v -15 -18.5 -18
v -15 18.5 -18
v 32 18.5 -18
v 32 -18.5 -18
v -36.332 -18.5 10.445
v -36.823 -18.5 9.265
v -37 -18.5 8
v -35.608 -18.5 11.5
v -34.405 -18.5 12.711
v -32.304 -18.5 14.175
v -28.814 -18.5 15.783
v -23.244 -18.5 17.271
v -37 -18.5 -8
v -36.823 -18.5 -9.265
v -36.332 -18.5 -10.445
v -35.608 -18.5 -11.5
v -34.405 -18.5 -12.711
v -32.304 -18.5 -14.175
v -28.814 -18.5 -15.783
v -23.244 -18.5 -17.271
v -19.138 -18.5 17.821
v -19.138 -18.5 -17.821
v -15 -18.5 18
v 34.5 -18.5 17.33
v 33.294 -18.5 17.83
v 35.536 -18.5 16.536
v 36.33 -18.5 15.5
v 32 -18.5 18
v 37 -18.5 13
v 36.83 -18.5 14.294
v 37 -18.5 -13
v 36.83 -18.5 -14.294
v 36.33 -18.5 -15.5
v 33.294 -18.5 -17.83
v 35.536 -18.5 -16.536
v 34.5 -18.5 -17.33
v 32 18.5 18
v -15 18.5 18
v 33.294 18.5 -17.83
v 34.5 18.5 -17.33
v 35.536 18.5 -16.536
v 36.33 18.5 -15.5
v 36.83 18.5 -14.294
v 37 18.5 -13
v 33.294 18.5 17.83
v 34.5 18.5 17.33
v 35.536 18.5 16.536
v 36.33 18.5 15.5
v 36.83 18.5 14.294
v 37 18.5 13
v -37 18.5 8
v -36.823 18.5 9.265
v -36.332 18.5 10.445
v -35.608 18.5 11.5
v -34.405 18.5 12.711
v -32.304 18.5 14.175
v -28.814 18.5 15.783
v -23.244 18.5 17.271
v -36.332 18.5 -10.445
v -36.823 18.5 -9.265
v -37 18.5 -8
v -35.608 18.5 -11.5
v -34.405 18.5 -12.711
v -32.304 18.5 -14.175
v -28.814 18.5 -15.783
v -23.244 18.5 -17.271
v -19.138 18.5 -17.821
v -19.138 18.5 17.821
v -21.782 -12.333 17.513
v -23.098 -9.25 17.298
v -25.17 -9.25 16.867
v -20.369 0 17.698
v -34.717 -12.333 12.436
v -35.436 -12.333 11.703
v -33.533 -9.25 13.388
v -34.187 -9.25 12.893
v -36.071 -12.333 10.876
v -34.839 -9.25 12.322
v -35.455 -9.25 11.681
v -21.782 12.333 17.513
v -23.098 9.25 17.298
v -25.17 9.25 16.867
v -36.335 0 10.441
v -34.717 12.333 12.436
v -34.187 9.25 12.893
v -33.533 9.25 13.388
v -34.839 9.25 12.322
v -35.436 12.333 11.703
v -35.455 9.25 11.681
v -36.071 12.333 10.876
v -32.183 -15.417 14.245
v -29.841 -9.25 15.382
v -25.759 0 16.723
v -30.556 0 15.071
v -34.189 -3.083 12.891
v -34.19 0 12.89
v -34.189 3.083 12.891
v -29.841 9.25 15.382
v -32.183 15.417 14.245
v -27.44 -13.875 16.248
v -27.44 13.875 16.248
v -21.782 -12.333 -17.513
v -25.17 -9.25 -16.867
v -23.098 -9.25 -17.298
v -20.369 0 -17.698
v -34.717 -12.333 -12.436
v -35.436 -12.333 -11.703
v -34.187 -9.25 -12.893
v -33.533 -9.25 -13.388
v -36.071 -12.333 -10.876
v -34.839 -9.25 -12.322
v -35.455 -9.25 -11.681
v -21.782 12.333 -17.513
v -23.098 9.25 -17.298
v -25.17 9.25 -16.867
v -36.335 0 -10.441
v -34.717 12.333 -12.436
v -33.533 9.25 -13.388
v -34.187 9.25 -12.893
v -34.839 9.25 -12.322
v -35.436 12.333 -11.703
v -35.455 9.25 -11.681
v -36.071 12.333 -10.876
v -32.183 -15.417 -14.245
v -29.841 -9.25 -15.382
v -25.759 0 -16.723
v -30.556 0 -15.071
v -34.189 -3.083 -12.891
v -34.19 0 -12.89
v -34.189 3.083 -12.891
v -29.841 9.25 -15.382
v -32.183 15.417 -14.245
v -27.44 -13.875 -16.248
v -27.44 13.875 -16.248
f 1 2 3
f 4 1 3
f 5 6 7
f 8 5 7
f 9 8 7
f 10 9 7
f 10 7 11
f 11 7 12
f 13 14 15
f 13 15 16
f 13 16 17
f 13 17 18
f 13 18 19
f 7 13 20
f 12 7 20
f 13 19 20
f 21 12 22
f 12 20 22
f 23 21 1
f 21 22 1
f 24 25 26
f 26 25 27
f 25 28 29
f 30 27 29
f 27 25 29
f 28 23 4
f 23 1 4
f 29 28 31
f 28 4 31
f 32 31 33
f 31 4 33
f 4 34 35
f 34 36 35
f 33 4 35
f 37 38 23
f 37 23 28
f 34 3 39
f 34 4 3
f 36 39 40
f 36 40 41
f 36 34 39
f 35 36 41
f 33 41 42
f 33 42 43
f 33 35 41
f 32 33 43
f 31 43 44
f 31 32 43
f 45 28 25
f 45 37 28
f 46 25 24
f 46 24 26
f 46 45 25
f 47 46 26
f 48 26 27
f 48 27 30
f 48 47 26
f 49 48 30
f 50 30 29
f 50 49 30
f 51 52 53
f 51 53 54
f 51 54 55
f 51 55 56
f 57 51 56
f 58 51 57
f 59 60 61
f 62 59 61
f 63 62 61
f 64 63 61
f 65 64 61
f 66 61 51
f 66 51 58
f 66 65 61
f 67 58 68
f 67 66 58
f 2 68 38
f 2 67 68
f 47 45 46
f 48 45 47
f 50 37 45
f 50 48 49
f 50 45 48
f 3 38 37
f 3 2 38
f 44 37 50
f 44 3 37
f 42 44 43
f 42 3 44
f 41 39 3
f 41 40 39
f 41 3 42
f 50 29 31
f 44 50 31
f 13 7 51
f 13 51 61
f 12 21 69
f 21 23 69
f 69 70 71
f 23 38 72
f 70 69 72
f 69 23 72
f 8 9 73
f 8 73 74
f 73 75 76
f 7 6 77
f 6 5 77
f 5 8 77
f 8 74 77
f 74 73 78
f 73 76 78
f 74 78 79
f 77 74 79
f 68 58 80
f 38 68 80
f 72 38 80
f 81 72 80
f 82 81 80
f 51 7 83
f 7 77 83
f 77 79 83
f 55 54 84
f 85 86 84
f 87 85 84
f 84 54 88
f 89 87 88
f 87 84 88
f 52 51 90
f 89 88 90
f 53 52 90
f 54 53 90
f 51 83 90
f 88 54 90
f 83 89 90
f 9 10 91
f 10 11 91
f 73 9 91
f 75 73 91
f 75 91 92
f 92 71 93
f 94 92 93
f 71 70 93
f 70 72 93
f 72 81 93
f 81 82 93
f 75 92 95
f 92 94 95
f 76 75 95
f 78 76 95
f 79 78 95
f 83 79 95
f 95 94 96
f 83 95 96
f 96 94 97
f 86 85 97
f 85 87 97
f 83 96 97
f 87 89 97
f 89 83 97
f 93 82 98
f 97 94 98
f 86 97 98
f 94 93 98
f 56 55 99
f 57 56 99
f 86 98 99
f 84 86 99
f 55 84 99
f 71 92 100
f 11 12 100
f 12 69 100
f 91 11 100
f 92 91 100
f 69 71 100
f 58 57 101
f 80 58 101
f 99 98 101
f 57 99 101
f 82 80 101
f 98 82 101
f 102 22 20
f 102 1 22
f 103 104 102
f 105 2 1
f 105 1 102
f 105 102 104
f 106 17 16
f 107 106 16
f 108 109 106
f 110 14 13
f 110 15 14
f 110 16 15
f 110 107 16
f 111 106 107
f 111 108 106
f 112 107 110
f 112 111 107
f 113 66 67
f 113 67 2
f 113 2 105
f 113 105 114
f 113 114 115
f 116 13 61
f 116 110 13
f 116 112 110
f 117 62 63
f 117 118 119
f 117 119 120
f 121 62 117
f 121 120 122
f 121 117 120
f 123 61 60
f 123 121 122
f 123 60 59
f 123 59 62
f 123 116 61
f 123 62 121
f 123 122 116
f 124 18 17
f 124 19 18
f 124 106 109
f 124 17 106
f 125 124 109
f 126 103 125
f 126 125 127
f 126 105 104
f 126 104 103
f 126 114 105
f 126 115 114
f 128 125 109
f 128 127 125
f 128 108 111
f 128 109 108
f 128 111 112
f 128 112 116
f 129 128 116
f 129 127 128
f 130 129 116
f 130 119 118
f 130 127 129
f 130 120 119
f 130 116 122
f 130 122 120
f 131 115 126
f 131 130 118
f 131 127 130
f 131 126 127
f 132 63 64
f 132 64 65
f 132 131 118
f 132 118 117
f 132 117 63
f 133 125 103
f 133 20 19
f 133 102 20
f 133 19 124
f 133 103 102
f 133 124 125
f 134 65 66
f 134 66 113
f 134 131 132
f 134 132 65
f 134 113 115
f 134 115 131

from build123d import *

# Parameters (mm, degrees)
SKETCH1_W           = 74
SKETCH1_H           = 36
BOSS_EXTRUDE1_DEPTH = 18.5
FILLET1_SIZE        = 22
FILLET1_SIZE_2      = 10
FILLET2_R           = 5


with BuildPart() as part:
    # Sketch1 → Boss-Extrude1 (new, symmetric)
    with BuildSketch(Plane(origin=(0, 0, 0), x_dir=(1, 0, 0), z_dir=(0, 1, 0))):
        Rectangle(SKETCH1_W, SKETCH1_H)
    extrude(amount=BOSS_EXTRUDE1_DEPTH, both=True)

    # Fillet1
    # an asymmetric fillet: 22, 10 mm, written as the material it takes off along each edge
    with BuildSketch(Plane(origin=(-37, 73.5, -18), x_dir=(1, 0, 0), z_dir=(0, -1, 0))) as fillet1_piece_1:
        with BuildLine():
            Bezier((FILLET1_SIZE, 0), (0, 0), (0, FILLET1_SIZE_2), weights=[1, 0.707106781, 1])
            Line((0, FILLET1_SIZE_2), (0, 0))
            Line((0, 0), (FILLET1_SIZE, 0))
        make_face()
    extrude(amount=147, mode=Mode.SUBTRACT)
    with BuildSketch(Plane(origin=(-37, 73.5, 18), x_dir=(1, 0, 0), z_dir=(0, -1, 0))) as fillet1_piece_2:
        with BuildLine():
            Bezier((FILLET1_SIZE, 0), (0, 0), (0, -FILLET1_SIZE_2), weights=[1, 0.707106781, 1])
            Line((0, -FILLET1_SIZE_2), (0, 0))
            Line((0, 0), (FILLET1_SIZE, 0))
        make_face()
    extrude(amount=147, mode=Mode.SUBTRACT)

    # Fillet2
    fillet2_edges = [part.edges().sort_by_distance(p)[0] for p in [
        (37, 0, -18),
        (37, 0, 18),
    ]]
    fillet(fillet2_edges, radius=FILLET2_R)


solid = part.part
